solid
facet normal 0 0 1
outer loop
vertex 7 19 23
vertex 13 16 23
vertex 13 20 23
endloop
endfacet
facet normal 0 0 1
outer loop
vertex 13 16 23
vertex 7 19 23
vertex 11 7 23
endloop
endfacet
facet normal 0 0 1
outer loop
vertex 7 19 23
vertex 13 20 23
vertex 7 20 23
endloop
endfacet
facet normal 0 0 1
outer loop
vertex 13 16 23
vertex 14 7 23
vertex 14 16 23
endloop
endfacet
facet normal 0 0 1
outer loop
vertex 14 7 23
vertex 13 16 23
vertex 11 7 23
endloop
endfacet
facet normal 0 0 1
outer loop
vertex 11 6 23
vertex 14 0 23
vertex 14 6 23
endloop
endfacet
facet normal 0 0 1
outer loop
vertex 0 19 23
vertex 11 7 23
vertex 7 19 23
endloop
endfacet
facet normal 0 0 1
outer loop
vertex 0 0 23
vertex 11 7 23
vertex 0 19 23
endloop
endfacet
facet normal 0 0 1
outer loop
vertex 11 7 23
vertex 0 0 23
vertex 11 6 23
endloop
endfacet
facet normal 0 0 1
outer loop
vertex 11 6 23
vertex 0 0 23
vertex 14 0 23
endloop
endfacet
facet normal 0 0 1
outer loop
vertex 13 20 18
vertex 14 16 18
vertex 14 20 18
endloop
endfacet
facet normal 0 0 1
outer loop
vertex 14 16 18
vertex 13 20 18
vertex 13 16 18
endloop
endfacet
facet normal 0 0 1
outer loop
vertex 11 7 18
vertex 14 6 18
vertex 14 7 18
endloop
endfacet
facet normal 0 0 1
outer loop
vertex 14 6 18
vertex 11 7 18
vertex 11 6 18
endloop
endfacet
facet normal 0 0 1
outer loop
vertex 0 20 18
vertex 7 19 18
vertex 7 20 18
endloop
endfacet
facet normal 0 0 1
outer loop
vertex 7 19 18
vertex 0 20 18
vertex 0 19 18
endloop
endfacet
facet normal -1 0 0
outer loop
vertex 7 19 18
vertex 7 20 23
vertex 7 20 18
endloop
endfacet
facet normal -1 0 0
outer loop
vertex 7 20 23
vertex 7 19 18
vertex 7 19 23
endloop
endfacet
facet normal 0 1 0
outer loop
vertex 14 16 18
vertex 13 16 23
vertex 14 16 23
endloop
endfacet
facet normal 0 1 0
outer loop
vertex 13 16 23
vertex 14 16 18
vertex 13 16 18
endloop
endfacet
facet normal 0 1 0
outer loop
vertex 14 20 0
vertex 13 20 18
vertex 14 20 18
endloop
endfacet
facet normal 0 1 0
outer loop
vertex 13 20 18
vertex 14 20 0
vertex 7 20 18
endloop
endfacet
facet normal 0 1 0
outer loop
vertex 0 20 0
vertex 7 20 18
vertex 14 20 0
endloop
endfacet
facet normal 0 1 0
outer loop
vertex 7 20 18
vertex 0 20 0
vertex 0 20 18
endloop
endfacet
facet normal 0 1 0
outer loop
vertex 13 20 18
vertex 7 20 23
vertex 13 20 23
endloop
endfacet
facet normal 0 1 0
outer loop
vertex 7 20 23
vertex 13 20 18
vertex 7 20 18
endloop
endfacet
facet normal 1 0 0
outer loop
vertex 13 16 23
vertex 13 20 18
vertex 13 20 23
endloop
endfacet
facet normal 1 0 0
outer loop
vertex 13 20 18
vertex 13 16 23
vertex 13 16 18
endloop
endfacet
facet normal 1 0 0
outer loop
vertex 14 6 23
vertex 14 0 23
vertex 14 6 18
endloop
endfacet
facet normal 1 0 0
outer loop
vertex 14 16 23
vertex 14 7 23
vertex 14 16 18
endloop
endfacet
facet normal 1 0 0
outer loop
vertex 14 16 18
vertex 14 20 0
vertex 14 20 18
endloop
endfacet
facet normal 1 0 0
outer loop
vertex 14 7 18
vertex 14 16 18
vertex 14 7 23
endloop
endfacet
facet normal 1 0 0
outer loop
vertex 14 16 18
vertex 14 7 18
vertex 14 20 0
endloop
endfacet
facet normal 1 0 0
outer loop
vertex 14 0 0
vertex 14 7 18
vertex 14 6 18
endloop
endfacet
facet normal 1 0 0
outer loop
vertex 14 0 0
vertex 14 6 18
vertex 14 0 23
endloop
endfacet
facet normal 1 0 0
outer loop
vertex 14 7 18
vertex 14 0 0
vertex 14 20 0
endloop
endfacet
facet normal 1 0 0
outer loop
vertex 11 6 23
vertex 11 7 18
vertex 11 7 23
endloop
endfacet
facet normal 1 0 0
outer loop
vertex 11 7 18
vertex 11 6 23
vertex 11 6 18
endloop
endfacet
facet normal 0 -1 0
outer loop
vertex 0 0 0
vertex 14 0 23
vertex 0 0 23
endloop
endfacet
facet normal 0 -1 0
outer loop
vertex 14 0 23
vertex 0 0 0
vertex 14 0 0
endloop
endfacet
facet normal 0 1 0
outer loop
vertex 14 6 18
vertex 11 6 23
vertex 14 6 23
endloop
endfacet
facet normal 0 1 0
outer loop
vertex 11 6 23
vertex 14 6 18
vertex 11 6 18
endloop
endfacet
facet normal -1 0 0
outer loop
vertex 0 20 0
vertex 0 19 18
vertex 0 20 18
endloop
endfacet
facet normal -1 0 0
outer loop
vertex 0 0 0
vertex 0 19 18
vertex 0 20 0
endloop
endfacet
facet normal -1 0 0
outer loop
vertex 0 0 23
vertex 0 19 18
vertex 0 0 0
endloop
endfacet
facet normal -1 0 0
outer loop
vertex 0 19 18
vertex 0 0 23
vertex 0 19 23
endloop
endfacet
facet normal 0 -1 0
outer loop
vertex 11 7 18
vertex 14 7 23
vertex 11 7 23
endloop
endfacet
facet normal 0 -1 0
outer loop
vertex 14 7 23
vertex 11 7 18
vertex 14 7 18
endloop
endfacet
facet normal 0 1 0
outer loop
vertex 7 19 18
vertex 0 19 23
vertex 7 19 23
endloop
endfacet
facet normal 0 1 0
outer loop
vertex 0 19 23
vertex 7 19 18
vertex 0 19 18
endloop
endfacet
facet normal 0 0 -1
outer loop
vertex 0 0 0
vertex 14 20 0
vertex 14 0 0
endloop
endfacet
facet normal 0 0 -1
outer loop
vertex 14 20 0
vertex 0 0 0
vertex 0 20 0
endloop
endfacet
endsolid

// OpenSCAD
translate([8.5, 17.0, 20.5]) color([0.19284823789822858, 0.6083188139076446, 0.606354511401297]) cube([3, 2, 5], center=true);
translate([8.5, 19.0, 20.5]) color([0.08562053587131313, 0.31903016062772993, 0.53590115499306]) cube([3, 2, 5], center=true);
translate([11.5, 17.0, 20.5]) color([0.8934753784920533, 0.25549985489866966, 0.5219903070058861]) cube([3, 2, 5], center=true);
translate([11.5, 19.0, 20.5]) color([0.1901317713313112, 0.08011594570868696, 0.8699478397109702]) cube([3, 2, 5], center=true);
translate([12.5, 1.0, 20.5]) color([0.3457472114844995, 0.837290862214726, 0.25127706432840136]) cube([3, 2, 5], center=true);
translate([12.5, 3.0, 20.5]) color([0.7290260027021367, 0.3013213449137814, 0.5169005458056509]) cube([3, 2, 5], center=true);
translate([12.5, 5.0, 20.5]) color([0.38467176448284957, 0.4820846642847386, 0.8719757028853922]) cube([3, 2, 5], center=true);
translate([12.5, 2.5, 14.5]) color([0.2399620044566907, 0.3058147052987177, 0.5519737755681405]) cube([3, 5, 7], center=true);
translate([12.5, 7.5, 14.5]) color([0.009208459116004764, 0.4953005367860557, 0.43819859659275806]) cube([3, 5, 7], center=true);
translate([12.5, 12.5, 14.5]) color([0.9171481192782721, 0.41212019308576986, 0.49358197644734136]) cube([3, 5, 7], center=true);
translate([12.5, 17.5, 14.5]) color([0.44010860560926524, 0.0856157398333921, 0.2411443971002879]) cube([3, 5, 7], center=true);
translate([3.5, 8.5, 20.5]) color([0.8262650576639278, 0.15379567752788093, 0.8842528530898255]) cube([7, 3, 5], center=true);
translate([3.5, 11.5, 20.5]) color([0.2134665283608419, 0.6127566924478359, 0.818008657000479]) cube([7, 3, 5], center=true);
translate([3.5, 14.5, 20.5]) color([0.5590112191053322, 0.8866043301622452, 0.39447102725022787]) cube([7, 3, 5], center=true);
translate([3.5, 17.5, 20.5]) color([0.9589163376419946, 0.24972819156954773, 0.22005049979750413]) cube([7, 3, 5], center=true);
translate([10.5, 8.5, 20.5]) color([0.8404590105346786, 0.2789960200671917, 0.35210354864297055]) cube([7, 3, 5], center=true);
translate([10.5, 11.5, 20.5]) color([0.9946691500756418, 0.10728537706325991, 0.8996256313138141]) cube([7, 3, 5], center=true);
translate([10.5, 14.5, 20.5]) color([0.6100819970747507, 0.7890377134172993, 0.7110679469752405]) cube([7, 3, 5], center=true);
translate([3.5, 2.5, 5.5]) color([0.7774643558396669, 0.5140354678382717, 0.46207744282607]) cube([7, 5, 11], center=true);
translate([3.5, 7.5, 5.5]) color([0.6343562920465169, 0.27254621857246664, 0.016558424522952975]) cube([7, 5, 11], center=true);
translate([3.5, 12.5, 5.5]) color([0.6148716567717017, 0.7119066573597548, 0.17257617960039529]) cube([7, 5, 11], center=true);
translate([3.5, 17.5, 5.5]) color([0.41465974039415787, 0.21806470516739018, 0.8797884787327306]) cube([7, 5, 11], center=true);
translate([10.5, 2.5, 5.5]) color([0.9971497033508181, 0.006439244314443648, 0.5355241113549698]) cube([7, 5, 11], center=true);
translate([10.5, 7.5, 5.5]) color([0.428269623660265, 0.0497703561320445, 0.3846945959716809]) cube([7, 5, 11], center=true);
translate([10.5, 12.5, 5.5]) color([0.27248481749180187, 0.9711494351721061, 0.5646669518865992]) cube([7, 5, 11], center=true);
translate([10.5, 17.5, 5.5]) color([0.22956269737245216, 0.7165492601952248, 0.5466375027642284]) cube([7, 5, 11], center=true);
translate([5.5, 2.5, 14.5]) color([0.2821670936164109, 0.7398695784196249, 0.9015687423954613]) cube([11, 5, 7], center=true);
translate([5.5, 7.5, 14.5]) color([0.06478718309218656, 0.3075184499818515, 0.32730937178137276]) cube([11, 5, 7], center=true);
translate([5.5, 12.5, 14.5]) color([0.373196919474838, 0.48026967262350795, 0.5820603979481933]) cube([11, 5, 7], center=true);
translate([5.5, 17.5, 14.5]) color([0.1372879505883815, 0.015498761483451418, 0.5048497045627587]) cube([11, 5, 7], center=true);
translate([5.5, 3.5, 20.5]) color([0.36698725510709684, 0.6348155217266559, 0.811995686067811]) cube([11, 7, 5], center=true);
